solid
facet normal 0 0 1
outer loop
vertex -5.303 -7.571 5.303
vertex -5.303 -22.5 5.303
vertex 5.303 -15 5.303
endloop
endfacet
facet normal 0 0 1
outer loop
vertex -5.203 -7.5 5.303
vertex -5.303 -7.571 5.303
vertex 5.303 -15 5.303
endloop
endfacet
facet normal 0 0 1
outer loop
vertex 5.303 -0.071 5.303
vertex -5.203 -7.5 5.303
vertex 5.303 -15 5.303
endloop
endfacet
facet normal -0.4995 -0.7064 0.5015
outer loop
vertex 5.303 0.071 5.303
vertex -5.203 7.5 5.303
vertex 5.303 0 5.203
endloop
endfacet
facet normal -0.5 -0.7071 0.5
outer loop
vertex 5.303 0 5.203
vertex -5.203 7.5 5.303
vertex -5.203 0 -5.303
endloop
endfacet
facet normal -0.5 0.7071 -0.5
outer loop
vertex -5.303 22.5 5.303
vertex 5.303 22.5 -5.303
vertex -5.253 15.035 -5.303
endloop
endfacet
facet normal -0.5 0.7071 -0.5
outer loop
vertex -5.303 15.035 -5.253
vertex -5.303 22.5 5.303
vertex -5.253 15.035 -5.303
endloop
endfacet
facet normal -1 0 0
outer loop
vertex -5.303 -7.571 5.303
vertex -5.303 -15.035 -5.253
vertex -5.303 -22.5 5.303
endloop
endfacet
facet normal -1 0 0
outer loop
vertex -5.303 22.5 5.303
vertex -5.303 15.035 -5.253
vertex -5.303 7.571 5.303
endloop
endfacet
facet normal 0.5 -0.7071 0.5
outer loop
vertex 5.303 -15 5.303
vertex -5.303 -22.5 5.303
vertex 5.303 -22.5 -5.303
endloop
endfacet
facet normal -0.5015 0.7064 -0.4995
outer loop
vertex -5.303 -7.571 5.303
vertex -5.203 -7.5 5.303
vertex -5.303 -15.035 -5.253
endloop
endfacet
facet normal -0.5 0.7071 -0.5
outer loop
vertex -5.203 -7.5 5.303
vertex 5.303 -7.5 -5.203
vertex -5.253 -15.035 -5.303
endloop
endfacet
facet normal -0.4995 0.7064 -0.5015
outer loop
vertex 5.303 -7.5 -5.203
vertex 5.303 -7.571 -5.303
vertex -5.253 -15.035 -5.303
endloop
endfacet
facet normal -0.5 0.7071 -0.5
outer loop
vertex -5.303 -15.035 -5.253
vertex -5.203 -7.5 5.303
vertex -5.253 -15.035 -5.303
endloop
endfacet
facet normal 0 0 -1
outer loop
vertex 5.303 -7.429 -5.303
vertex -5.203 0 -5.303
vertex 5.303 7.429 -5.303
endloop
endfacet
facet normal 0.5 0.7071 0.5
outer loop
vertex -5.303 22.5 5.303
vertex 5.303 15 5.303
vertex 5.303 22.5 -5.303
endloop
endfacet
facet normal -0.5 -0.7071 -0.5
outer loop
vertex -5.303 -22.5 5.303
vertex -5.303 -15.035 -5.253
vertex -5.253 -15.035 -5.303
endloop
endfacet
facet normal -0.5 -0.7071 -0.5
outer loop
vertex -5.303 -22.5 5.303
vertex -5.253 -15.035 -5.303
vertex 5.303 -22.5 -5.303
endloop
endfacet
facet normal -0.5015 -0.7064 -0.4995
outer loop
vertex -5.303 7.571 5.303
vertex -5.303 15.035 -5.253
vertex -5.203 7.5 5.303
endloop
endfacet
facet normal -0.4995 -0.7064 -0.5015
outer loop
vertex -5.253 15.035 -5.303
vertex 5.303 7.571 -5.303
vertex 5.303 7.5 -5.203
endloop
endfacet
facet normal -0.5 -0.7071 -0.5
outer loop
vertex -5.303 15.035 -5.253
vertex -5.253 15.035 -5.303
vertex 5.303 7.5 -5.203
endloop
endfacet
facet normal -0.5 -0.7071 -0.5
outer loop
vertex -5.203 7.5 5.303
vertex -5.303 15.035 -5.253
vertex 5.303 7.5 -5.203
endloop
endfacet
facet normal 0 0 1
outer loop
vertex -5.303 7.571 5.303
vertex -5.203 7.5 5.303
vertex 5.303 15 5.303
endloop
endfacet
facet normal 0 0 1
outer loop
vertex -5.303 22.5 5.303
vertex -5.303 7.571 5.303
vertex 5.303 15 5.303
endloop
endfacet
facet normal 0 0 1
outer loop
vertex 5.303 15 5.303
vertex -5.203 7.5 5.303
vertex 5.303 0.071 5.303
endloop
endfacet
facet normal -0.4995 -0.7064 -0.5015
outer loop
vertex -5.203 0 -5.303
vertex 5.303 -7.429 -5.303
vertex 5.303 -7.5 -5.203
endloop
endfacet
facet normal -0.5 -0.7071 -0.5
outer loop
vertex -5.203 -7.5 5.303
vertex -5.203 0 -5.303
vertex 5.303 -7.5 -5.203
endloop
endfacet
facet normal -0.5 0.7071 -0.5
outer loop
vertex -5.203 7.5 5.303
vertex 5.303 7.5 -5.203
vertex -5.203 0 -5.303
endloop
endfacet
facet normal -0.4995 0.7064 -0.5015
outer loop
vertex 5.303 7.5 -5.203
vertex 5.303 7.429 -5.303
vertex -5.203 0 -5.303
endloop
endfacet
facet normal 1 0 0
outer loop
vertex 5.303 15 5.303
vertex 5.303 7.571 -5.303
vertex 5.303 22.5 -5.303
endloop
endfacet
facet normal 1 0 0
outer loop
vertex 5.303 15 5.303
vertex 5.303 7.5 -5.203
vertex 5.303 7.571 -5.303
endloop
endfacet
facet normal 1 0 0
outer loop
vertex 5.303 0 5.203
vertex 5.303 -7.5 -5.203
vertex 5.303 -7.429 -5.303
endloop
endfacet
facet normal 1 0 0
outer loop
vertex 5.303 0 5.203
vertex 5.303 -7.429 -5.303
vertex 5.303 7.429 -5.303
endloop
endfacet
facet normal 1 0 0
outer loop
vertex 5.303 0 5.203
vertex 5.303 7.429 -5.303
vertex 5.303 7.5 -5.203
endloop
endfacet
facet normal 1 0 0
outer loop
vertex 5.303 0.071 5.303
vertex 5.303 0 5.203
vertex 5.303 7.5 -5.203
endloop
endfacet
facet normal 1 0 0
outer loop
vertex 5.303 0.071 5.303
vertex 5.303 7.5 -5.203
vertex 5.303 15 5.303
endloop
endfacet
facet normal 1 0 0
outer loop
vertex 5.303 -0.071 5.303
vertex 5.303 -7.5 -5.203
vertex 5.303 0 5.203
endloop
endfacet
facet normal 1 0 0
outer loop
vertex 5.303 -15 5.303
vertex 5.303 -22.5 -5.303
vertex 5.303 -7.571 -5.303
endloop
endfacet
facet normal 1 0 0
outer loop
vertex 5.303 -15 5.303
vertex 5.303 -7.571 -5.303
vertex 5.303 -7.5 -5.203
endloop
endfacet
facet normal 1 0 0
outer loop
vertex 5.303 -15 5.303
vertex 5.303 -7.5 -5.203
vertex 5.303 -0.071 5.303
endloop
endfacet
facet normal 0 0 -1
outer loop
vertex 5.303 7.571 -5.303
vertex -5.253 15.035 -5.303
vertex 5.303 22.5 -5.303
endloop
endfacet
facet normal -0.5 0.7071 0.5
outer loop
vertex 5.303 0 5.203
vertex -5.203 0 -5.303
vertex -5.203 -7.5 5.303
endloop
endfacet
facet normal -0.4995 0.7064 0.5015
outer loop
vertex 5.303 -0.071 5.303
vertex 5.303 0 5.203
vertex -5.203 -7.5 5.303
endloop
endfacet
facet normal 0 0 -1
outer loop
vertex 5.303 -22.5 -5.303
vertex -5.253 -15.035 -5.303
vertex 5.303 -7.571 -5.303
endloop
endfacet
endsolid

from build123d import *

# Parameters (mm, degrees)
F0_W      = 10.6066017178
F0_H      = 10.6066017178
F1_DEPTH  = 22.5
F4_DEPTH  = 15
F6_DEPTH  = 15
F9_DEPTH  = 15
F11_DEPTH = 15
F13_DEPTH = 15


# Not quite as in the source:
# - a feature names something its author has since deleted; it is built from what else it names


with BuildPart() as f1:
    # F0 (on Front) → F1 (new body, symmetric)
    with BuildSketch(Plane.XZ):
        Rectangle(F0_W, F0_H)
    extrude(amount=F1_DEPTH, both=True)

    # F3 (on 3pt) → F4 (cut, symmetric)
    with BuildSketch(Plane(origin=(0, 0, 0), x_dir=(0, 1, 0), z_dir=(0.7071067812, 0, -0.7071067812))):
        Polygon((-15, -7.5), (-22.5, 0), (-15, 7.5), (-15, 9.5), (-24.5, 9.5), (-24.5, -9.5), (-15, -9.5), align=None)
        Polygon((15, 7.5), (22.5, 0), (15, -7.5), (15, -9.5), (24.5, -9.5), (24.5, 9.5), (15, 9.5), align=None)
    extrude(amount=F4_DEPTH, both=True, mode=Mode.SUBTRACT)

    # F5 (on 3pt) → F6 (cut, symmetric)
    with BuildSketch(Plane(origin=(0, 0, 0), x_dir=(0, 1, 0), z_dir=(0.7071067812, 0, -0.7071067812))):
        Polygon((7.5, 0), (0, -7.5), (-7.5, 0), (-15, -7.5), (-15, -9.5), (15, -9.5), (15, -7.5), align=None)
    extrude(amount=F6_DEPTH, both=True, mode=Mode.SUBTRACT)

    # F8 (on 3pt) → F9 (cut, symmetric)
    with BuildSketch(Plane(origin=(0, 0, 0), x_dir=(0, -1, 0), z_dir=(-0.7071067812, 0, -0.7071067812))):
        Polygon((-7.5, 7.5), (0, 0), (7.5, 7.5), (7.5, 9.5), (-7.5, 9.5), align=None)
    extrude(amount=F9_DEPTH, both=True, mode=Mode.SUBTRACT)

    # F10 (on 3pt) → F11 (cut, symmetric)
    with BuildSketch(Plane(origin=(0, 0, 0), x_dir=(0, 1, 0), z_dir=(0.7071067812, 0, -0.7071067812))):
        Polygon((-17.0707106781, -9.5), (17.0707106781, -9.5), (7.5, 0.0707106781), (0, -7.4292893219), (-7.5, 0.0707106781), align=None)
    extrude(amount=F11_DEPTH, both=True, mode=Mode.SUBTRACT)

    # F12 (on 3pt) → F13 (cut, symmetric)
    with BuildSketch(Plane(origin=(0, 0, 0), x_dir=(0, -1, 0), z_dir=(-0.7071067812, 0, -0.7071067812))):
        Polygon((9.5707106781, 9.5), (-9.5707106781, 9.5), (0, -0.0707106781), align=None)
    extrude(amount=F13_DEPTH, both=True, mode=Mode.SUBTRACT)


solid = f1.part
